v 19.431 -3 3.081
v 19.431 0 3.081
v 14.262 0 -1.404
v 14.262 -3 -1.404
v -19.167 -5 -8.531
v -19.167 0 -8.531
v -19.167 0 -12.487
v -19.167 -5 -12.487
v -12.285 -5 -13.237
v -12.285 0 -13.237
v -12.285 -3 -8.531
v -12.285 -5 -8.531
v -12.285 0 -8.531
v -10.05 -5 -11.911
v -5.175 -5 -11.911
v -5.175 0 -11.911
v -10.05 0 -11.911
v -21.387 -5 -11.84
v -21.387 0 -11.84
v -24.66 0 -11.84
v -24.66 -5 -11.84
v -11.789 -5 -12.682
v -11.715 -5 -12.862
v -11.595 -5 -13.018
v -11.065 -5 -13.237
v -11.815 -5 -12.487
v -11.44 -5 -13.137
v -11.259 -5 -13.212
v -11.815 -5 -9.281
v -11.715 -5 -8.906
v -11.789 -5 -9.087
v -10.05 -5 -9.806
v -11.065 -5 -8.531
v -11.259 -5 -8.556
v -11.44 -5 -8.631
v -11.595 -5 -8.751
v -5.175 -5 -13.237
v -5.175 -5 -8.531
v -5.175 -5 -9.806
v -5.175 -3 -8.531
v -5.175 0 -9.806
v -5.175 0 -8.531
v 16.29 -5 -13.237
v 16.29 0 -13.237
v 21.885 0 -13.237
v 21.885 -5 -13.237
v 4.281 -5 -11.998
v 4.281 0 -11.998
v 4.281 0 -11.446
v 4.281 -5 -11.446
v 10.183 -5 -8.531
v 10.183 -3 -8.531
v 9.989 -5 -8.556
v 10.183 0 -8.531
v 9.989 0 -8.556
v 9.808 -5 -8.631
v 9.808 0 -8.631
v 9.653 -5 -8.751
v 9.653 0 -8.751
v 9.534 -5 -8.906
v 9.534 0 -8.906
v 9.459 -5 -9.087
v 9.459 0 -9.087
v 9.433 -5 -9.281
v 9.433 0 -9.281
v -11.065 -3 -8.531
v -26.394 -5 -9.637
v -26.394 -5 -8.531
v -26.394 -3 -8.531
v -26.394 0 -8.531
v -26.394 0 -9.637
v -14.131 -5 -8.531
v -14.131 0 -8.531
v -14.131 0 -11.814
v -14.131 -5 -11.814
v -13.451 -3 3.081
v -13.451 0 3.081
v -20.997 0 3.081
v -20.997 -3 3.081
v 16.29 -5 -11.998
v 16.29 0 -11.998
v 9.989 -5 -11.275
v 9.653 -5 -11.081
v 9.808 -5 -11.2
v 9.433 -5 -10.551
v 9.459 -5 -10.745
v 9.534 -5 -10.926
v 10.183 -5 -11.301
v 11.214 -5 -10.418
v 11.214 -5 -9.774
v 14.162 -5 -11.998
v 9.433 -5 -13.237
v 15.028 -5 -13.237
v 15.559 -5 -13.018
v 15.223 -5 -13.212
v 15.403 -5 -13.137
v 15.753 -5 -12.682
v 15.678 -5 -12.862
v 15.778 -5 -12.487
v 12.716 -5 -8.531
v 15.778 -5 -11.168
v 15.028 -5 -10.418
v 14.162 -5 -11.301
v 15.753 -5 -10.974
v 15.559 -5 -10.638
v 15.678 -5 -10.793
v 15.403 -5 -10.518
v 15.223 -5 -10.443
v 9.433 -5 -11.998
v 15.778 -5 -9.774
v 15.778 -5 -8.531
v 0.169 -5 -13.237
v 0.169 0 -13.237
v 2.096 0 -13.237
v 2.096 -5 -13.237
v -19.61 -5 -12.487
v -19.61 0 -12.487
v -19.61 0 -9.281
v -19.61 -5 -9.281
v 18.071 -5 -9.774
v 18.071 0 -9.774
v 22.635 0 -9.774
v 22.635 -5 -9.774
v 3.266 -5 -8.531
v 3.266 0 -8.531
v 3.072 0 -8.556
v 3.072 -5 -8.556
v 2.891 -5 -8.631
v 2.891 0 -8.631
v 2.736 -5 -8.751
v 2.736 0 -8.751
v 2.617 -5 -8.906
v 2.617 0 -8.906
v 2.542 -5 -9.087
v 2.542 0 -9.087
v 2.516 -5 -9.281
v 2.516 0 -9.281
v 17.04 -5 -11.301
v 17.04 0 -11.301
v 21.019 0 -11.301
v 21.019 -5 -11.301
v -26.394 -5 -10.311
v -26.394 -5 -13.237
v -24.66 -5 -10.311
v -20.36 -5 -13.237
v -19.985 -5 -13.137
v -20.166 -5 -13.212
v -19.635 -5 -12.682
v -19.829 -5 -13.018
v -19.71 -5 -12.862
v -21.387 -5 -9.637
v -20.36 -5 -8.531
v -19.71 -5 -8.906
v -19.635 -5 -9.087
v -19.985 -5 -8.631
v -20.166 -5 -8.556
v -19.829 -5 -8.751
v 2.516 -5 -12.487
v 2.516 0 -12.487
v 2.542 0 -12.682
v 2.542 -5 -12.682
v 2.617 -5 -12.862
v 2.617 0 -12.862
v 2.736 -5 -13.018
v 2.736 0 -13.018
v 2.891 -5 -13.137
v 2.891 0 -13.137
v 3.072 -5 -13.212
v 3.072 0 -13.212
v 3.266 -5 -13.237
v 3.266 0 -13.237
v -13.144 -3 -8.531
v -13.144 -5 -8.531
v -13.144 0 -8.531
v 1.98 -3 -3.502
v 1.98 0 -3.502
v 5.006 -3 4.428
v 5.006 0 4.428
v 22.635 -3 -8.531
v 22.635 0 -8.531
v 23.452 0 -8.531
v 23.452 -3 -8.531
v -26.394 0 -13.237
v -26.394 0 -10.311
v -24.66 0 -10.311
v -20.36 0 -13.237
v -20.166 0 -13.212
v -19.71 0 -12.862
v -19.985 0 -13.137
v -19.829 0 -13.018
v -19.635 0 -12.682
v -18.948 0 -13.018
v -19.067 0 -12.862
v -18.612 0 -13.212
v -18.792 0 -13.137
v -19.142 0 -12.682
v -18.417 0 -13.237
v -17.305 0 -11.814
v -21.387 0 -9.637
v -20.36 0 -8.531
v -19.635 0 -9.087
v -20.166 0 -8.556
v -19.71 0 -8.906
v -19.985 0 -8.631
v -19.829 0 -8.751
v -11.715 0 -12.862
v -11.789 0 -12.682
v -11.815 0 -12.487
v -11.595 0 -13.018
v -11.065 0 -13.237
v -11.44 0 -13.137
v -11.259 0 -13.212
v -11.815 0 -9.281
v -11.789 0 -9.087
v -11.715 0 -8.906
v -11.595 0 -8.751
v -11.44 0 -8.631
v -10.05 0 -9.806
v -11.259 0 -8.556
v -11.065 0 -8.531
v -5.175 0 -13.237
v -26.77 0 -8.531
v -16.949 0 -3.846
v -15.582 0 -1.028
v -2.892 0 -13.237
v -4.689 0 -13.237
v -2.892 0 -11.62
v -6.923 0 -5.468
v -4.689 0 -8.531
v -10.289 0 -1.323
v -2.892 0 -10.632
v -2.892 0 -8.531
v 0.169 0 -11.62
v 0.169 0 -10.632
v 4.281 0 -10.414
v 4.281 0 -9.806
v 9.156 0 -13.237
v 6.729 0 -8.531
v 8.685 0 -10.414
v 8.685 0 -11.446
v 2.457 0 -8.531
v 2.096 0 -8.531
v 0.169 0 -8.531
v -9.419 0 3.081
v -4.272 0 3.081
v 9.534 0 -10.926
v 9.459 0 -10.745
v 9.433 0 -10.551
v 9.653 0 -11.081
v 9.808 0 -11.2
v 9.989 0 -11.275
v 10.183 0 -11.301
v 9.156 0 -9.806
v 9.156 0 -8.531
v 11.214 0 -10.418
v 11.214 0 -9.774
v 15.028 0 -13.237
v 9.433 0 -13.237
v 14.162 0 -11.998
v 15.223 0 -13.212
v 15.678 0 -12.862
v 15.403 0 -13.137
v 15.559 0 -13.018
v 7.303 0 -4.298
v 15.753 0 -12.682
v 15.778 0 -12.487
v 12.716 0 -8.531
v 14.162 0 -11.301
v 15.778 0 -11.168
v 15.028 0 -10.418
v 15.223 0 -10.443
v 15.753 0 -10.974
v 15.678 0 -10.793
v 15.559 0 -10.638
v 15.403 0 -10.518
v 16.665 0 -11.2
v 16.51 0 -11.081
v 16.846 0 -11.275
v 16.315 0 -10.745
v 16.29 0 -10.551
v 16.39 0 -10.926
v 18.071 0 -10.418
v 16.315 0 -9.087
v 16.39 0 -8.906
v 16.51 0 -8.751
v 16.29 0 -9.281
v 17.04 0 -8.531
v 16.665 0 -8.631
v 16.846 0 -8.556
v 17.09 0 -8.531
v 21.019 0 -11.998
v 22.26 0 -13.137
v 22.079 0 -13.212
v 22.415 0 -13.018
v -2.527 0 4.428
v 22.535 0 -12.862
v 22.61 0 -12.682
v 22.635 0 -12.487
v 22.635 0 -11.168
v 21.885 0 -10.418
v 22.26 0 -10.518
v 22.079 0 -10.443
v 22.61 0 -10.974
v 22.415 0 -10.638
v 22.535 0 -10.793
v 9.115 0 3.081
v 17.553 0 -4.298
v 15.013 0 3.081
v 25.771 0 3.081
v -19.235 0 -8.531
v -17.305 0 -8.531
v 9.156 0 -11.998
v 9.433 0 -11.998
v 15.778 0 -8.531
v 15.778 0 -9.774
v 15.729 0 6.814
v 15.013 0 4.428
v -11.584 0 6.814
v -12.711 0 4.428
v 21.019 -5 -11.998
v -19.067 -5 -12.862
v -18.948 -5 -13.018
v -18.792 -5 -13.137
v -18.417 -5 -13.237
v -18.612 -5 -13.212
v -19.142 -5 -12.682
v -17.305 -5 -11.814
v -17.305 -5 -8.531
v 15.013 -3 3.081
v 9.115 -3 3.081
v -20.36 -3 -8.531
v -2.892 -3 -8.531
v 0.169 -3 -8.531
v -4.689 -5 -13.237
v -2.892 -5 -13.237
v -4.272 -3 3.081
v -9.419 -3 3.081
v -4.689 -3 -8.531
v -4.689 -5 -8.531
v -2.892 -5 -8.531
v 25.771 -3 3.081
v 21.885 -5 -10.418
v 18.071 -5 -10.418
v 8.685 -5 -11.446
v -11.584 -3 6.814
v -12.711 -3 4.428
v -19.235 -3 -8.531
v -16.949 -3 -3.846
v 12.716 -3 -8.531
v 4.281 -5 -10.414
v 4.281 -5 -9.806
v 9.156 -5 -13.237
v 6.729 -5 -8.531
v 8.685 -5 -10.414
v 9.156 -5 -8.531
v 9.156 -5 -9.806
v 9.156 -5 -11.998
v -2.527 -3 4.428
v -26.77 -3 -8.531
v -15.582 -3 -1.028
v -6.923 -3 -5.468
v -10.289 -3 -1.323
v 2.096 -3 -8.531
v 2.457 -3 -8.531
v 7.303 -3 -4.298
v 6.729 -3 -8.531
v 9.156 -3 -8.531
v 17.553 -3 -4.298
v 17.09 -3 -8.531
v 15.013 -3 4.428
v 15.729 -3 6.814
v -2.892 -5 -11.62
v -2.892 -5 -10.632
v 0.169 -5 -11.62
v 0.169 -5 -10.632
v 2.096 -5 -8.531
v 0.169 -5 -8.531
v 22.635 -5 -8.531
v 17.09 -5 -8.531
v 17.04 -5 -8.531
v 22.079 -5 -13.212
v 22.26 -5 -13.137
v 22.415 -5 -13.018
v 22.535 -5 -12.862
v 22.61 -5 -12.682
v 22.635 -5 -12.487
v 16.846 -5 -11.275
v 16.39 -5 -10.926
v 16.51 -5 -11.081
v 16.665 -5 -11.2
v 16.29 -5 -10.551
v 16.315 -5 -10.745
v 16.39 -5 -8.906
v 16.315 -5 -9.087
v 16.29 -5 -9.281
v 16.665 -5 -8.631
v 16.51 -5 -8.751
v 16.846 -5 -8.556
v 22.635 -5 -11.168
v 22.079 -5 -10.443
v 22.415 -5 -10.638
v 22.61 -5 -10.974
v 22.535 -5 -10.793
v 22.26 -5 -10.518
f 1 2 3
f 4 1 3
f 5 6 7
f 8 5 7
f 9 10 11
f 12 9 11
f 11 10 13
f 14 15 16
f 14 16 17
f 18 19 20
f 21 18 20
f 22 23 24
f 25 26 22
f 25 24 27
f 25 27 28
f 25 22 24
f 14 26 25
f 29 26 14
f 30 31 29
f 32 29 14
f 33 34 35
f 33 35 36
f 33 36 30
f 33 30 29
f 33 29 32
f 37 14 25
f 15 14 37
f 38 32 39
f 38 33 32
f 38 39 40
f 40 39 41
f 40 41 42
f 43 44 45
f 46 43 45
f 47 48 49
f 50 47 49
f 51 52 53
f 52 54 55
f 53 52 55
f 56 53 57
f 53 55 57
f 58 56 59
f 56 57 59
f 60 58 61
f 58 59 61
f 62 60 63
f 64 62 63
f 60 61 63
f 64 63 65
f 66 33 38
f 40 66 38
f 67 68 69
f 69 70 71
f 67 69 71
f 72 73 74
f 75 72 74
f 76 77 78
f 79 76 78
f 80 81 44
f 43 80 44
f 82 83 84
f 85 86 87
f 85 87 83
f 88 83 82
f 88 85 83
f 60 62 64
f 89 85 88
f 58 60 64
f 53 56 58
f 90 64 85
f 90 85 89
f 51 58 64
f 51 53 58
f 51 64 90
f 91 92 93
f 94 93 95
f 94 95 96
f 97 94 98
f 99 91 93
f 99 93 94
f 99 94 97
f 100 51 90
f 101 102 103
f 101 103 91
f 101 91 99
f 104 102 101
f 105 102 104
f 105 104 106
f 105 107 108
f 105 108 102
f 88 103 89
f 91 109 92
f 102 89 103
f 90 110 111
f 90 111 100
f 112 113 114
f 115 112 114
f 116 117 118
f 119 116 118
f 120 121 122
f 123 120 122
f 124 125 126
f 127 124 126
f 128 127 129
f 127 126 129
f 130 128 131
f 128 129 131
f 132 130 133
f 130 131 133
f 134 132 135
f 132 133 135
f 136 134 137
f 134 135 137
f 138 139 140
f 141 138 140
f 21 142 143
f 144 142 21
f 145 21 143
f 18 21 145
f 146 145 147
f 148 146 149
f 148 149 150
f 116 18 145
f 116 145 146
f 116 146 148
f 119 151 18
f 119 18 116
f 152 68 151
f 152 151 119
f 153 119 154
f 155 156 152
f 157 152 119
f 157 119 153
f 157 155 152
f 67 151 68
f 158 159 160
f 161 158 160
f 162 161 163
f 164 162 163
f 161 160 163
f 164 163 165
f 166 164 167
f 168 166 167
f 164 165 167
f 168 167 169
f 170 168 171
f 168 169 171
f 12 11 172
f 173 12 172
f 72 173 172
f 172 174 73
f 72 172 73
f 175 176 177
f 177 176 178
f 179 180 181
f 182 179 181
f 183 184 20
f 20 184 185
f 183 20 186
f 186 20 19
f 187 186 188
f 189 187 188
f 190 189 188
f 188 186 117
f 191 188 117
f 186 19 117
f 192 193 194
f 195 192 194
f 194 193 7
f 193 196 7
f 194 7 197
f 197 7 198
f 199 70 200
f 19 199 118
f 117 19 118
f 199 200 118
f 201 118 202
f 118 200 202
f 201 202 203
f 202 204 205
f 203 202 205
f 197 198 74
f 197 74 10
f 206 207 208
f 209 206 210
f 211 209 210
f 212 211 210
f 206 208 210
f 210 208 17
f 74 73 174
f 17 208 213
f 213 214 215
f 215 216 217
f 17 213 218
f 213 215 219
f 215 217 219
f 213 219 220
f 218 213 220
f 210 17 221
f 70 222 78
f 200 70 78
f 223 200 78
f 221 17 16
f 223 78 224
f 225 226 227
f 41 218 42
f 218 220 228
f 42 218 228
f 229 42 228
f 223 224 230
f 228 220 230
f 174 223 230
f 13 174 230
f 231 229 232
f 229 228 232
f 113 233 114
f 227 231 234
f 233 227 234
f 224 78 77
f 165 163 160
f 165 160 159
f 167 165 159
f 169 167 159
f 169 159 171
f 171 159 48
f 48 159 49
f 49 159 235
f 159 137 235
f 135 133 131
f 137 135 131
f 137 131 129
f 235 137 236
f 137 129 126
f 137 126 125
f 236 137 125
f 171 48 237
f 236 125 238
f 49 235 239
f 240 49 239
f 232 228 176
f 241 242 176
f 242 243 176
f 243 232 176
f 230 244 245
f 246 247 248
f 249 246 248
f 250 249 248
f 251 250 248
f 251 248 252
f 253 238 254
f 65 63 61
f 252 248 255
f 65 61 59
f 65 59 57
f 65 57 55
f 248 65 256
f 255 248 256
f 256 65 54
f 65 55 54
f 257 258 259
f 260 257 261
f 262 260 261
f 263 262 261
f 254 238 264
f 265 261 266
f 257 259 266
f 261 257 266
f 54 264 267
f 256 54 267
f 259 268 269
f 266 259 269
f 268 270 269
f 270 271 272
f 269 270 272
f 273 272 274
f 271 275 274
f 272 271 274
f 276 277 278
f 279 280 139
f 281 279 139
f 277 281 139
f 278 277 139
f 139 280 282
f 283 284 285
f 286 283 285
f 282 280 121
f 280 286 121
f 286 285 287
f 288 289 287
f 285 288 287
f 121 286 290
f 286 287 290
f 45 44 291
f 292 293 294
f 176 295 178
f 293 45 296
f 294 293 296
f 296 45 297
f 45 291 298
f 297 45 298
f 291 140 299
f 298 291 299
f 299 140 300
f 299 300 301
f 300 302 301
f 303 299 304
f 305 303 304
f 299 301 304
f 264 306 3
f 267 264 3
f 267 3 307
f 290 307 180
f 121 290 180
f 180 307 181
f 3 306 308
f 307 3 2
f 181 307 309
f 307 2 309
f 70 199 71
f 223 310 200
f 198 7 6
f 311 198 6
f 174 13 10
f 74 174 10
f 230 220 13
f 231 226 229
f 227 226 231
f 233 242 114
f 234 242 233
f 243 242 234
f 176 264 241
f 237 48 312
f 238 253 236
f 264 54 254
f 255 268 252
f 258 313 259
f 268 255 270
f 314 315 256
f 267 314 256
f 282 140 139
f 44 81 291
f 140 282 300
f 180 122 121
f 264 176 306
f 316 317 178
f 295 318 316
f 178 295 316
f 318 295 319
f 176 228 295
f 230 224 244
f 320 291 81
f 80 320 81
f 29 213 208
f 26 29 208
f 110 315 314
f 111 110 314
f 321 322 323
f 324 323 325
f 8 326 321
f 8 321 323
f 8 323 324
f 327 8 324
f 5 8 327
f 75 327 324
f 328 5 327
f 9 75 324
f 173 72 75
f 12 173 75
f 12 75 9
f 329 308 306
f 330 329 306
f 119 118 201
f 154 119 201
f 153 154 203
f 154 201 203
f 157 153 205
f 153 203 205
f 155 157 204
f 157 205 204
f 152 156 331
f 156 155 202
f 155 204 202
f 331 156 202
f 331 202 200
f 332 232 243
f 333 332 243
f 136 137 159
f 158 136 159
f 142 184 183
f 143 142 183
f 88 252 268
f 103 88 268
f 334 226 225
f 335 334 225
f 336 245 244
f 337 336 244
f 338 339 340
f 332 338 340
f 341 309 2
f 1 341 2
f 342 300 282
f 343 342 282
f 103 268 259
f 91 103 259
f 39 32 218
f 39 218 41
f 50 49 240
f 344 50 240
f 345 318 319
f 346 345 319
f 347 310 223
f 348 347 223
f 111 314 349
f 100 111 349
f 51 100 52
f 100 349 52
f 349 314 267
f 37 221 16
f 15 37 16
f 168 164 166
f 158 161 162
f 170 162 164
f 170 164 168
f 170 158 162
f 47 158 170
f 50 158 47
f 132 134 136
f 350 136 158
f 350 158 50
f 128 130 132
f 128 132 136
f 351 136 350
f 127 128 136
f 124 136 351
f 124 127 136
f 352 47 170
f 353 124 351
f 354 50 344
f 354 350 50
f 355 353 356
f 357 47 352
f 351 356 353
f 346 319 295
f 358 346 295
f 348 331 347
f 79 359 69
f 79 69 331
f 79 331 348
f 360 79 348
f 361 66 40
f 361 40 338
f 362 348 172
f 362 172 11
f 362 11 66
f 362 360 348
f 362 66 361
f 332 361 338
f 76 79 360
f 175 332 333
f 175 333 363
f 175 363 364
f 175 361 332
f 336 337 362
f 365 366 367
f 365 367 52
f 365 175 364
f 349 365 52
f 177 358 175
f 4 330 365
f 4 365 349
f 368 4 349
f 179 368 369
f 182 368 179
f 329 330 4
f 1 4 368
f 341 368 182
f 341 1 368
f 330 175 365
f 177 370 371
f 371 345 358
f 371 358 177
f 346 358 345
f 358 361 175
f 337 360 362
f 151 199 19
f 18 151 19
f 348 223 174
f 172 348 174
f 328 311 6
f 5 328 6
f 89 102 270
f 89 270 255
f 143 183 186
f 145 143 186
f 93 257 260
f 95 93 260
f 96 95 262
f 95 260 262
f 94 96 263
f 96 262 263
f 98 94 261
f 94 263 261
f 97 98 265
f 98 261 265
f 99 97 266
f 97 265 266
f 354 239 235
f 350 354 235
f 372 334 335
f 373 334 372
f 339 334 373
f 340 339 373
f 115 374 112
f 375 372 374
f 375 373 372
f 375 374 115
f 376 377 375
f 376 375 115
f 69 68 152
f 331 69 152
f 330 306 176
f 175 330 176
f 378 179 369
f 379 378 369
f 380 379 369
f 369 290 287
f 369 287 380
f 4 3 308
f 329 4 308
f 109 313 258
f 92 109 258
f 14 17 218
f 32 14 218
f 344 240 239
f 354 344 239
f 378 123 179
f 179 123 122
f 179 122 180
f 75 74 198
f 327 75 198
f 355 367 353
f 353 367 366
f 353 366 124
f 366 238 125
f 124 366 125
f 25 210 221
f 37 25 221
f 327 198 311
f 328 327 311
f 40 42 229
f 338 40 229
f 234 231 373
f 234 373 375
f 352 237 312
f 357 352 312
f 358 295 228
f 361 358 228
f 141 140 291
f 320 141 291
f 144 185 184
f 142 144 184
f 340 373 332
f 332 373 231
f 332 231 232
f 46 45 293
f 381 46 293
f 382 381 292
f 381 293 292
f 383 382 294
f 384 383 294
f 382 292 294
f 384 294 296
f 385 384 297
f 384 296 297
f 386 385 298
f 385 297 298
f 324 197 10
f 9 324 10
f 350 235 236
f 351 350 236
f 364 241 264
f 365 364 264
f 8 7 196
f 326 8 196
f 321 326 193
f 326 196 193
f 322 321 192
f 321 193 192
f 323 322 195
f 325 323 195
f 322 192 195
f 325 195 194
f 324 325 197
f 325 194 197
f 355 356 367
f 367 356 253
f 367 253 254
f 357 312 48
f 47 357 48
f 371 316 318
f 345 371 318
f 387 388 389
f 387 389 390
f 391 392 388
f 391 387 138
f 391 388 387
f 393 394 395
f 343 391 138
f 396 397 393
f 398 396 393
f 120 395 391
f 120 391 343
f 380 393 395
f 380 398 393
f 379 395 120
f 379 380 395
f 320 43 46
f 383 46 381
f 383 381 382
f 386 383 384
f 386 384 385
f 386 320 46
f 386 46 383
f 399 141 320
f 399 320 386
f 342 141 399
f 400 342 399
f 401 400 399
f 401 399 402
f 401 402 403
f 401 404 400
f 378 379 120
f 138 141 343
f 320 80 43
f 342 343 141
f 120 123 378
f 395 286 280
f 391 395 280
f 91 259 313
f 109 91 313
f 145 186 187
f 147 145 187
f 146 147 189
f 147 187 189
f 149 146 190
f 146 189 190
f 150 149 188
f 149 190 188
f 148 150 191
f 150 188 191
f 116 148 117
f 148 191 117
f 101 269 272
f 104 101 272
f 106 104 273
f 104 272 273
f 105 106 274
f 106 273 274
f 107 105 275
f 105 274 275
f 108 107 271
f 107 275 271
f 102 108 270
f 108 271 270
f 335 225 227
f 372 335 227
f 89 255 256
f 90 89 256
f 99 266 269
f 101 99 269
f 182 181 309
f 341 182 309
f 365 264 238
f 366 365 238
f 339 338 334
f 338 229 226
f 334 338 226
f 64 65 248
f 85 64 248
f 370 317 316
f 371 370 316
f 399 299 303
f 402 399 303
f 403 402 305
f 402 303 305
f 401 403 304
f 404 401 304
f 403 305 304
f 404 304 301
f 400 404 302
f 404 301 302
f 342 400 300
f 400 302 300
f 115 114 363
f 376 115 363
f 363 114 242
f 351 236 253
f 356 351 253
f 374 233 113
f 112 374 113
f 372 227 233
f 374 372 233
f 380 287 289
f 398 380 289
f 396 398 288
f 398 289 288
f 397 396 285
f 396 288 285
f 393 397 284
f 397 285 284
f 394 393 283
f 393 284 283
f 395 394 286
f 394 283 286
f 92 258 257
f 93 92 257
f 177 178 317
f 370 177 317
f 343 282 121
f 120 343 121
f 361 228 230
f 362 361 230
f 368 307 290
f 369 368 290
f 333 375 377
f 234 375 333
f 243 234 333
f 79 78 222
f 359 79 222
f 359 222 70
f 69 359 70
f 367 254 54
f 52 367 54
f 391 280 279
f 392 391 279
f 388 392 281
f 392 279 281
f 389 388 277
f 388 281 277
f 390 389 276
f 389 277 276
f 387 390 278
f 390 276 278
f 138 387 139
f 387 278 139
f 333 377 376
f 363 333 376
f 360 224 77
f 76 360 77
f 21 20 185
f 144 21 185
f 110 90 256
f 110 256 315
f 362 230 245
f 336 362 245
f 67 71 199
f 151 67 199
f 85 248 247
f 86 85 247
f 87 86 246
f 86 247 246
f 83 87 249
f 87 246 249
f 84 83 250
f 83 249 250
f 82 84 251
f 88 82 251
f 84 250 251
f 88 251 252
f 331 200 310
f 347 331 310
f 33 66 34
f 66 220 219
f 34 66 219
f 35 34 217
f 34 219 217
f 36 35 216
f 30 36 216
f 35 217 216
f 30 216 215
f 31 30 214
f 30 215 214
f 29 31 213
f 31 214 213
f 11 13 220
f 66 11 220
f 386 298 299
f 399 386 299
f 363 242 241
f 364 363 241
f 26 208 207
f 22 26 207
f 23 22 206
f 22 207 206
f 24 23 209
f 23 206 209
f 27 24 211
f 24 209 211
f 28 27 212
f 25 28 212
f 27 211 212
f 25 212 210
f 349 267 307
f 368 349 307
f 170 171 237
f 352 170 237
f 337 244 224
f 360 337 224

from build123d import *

# Parameters (mm, degrees)
F0_W     = 3.0607780209
F0_H     = 2.1009956449
F1_DEPTH = 5
F2_W     = 53.2925797864
F2_H     = 15.6581131741
F3_DEPTH = 2


with BuildPart() as f1:
    # F0 (on Front) → F1 (new body)
    with BuildSketch(Plane.XZ):
        with BuildLine():
            Line((-13.4510826319, 3.0807058793), (-20.9973859143, 3.0807058793))
            Line((-20.9973859143, 3.0807058793), (-26.770388545, -8.5309240967))
            Line((-26.770388545, -8.5309240967), (-26.3940021396, -8.5309240967))
            Line((-26.3940021396, -8.5309240967), (-26.3940021396, -9.6365026161))
            Line((-26.3940021396, -9.6365026161), (-21.3870331645, -9.6365026161))
            Line((-21.3870331645, -9.6365026161), (-21.3870331645, -11.8402632847))
            Line((-21.3870331645, -11.8402632847), (-24.6597826481, -11.8402632847))
            Line((-24.6597826481, -11.8402632847), (-24.6597826481, -10.3107876107))
            Line((-24.6597826481, -10.3107876107), (-26.3940021396, -10.3107876107))
            Line((-26.3940021396, -10.3107876107), (-26.3940021396, -13.2374753207))
            Line((-26.3940021396, -13.2374753207), (-20.359800871, -13.2374753207))
            ThreePointArc((-20.359800871, -13.2374753207), (-19.8294707851, -13.0178054066), (-19.609800871, -12.4874753207))
            Line((-19.609800871, -12.4874753207), (-19.609800871, -9.2809240967))
            ThreePointArc((-19.609800871, -9.2809240967), (-19.8294707851, -8.7505940108), (-20.359800871, -8.5309240967))
            Line((-20.359800871, -8.5309240967), (-19.2351932671, -8.5309240967))
            Line((-19.2351932671, -8.5309240967), (-16.9493351132, -3.8456239272))
            Line((-16.9493351132, -3.8456239272), (-13.144302211, -8.5309240967))
            Line((-13.144302211, -8.5309240967), (-14.130868949, -8.5309240967))
            Line((-14.130868949, -8.5309240967), (-14.130868949, -11.8141257167))
            Line((-14.130868949, -11.8141257167), (-17.3050090671, -11.8141257167))
            Line((-17.3050090671, -11.8141257167), (-17.3050090671, -8.5309240967))
            Line((-17.3050090671, -8.5309240967), (-19.167387858, -8.5309240967))
            Line((-19.167387858, -8.5309240967), (-19.167387858, -12.4874120876))
            ThreePointArc((-19.167387858, -12.4874120876), (-18.9477179439, -13.0177421735), (-18.417387858, -13.2374120876))
            Line((-18.417387858, -13.2374120876), (-12.2846849263, -13.2374120876))
            Line((-12.2846849263, -13.2374120876), (-12.2846849263, -8.5309240967))
            Line((-12.2846849263, -8.5309240967), (-11.065042235, -8.5309240967))
            ThreePointArc((-11.065042235, -8.5309240967), (-11.5953723208, -8.7505940108), (-11.815042235, -9.2809240967))
            Line((-11.815042235, -9.2809240967), (-11.815042235, -12.4874753207))
            ThreePointArc((-11.815042235, -12.4874753207), (-11.5953723208, -13.0178054066), (-11.065042235, -13.2374753207))
            Line((-11.065042235, -13.2374753207), (-5.1752589643, -13.2374753207))
            Line((-5.1752589643, -13.2374753207), (-5.1752589643, -11.9112924635))
            Line((-5.1752589643, -11.9112924635), (-10.0498311222, -11.9112924635))
            Line((-10.0498311222, -11.9112924635), (-10.0498311222, -9.8059958741))
            Line((-10.0498311222, -9.8059958741), (-5.1752589643, -9.8059958741))
            Line((-5.1752589643, -9.8059958741), (-5.1752589643, -8.5309240967))
            Line((-5.1752589643, -8.5309240967), (-4.6894219704, -8.5309240967))
            Line((-4.6894219704, -8.5309240967), (-4.6894219704, -13.2374753207))
            Line((-4.6894219704, -13.2374753207), (-2.891822136, -13.2374753207))
            Line((-2.891822136, -13.2374753207), (-2.891822136, -11.6197903603))
            Line((-2.891822136, -11.6197903603), (0.1689558849, -11.6197903603))
            Line((0.1689558849, -11.6197903603), (0.1689558849, -13.2374753207))
            Line((0.1689558849, -13.2374753207), (2.096112119, -13.2374753207))
            Line((2.096112119, -13.2374753207), (2.096112119, -8.5309240967))
            Line((2.096112119, -8.5309240967), (2.4571896065, -8.5309240967))
            Line((2.4571896065, -8.5309240967), (7.3034735397, -4.2975358665))
            Line((7.3034735397, -4.2975358665), (6.7291194573, -8.5309240967))
            Line((6.7291194573, -8.5309240967), (3.2661118247, -8.5309240967))
            ThreePointArc((3.2661118247, -8.5309240967), (2.7357817388, -8.7505940108), (2.5161118247, -9.2809240967))
            Line((2.5161118247, -9.2809240967), (2.5161118247, -12.4874753207))
            ThreePointArc((2.5161118247, -12.4874753207), (2.7357817388, -13.0178054066), (3.2661118247, -13.2374753207))
            Line((3.2661118247, -13.2374753207), (9.1558950953, -13.2374753207))
            Line((9.1558950953, -13.2374753207), (9.1558950953, -11.9984643534))
            Line((9.1558950953, -11.9984643534), (4.2813229375, -11.9984643534))
            Line((4.2813229375, -11.9984643534), (4.2813229375, -11.445844546))
            Line((4.2813229375, -11.445844546), (8.6850486696, -11.445844546))
            Line((8.6850486696, -11.445844546), (8.6850486696, -10.4135535657))
            Line((8.6850486696, -10.4135535657), (4.2813229375, -10.4135535657))
            Line((4.2813229375, -10.4135535657), (4.2813229375, -9.805932641))
            Line((4.2813229375, -9.805932641), (9.1558950953, -9.805932641))
            Line((9.1558950953, -9.805932641), (9.1558950953, -8.5309240967))
            Line((9.1558950953, -8.5309240967), (10.1831596047, -8.5309240967))
            ThreePointArc((10.1831596047, -8.5309240967), (9.6528295188, -8.7505940108), (9.4331596047, -9.2809240967))
            Line((9.4331596047, -9.2809240967), (9.4331596047, -10.550885953))
            ThreePointArc((9.4331596047, -10.550885953), (9.6528295188, -11.0812160389), (10.1831596047, -11.300885953))
            Line((10.1831596047, -11.300885953), (14.1622014344, -11.300885953))
            Line((14.1622014344, -11.300885953), (14.1622014344, -11.9984643534))
            Line((14.1622014344, -11.9984643534), (9.4331596047, -11.9984643534))
            Line((9.4331596047, -11.9984643534), (9.4331596047, -13.2374120876))
            Line((9.4331596047, -13.2374120876), (15.0284558833, -13.2374120876))
            ThreePointArc((15.0284558833, -13.2374120876), (15.5587859692, -13.0177421735), (15.7784558833, -12.4874120876))
            Line((15.7784558833, -12.4874120876), (15.7784558833, -11.1678693146))
            ThreePointArc((15.7784558833, -11.1678693146), (15.5587859692, -10.6375392287), (15.0284558833, -10.4178693146))
            Line((15.0284558833, -10.4178693146), (11.2140327692, -10.4178693146))
            Line((11.2140327692, -10.4178693146), (11.2140327692, -9.7743598744))
            Line((11.2140327692, -9.7743598744), (15.7784558833, -9.7743598744))
            Line((15.7784558833, -9.7743598744), (15.7784558833, -8.5309240967))
            Line((15.7784558833, -8.5309240967), (12.7156563103, -8.5309240967))
            Line((12.7156563103, -8.5309240967), (17.5534840673, -4.2975358665))
            Line((17.5534840673, -4.2975358665), (17.0895829797, -8.5309240967))
            Line((17.0895829797, -8.5309240967), (17.0398395211, -8.5309240967))
            ThreePointArc((17.0398395211, -8.5309240967), (16.5095094352, -8.7505940108), (16.2898395211, -9.2809240967))
            Line((16.2898395211, -9.2809240967), (16.2898395211, -10.550885953))
            ThreePointArc((16.2898395211, -10.550885953), (16.5095094352, -11.0812160389), (17.0398395211, -11.300885953))
            Line((17.0398395211, -11.300885953), (21.0188813508, -11.300885953))
            Line((21.0188813508, -11.300885953), (21.0188813508, -11.9984643534))
            Line((21.0188813508, -11.9984643534), (16.2898395211, -11.9984643534))
            Line((16.2898395211, -11.9984643534), (16.2898395211, -13.2374120876))
            Line((16.2898395211, -13.2374120876), (21.8851357996, -13.2374120876))
            ThreePointArc((21.8851357996, -13.2374120876), (22.4154658855, -13.0177421735), (22.6351357996, -12.4874120876))
            Line((22.6351357996, -12.4874120876), (22.6351357996, -11.1678693146))
            ThreePointArc((22.6351357996, -11.1678693146), (22.4154658855, -10.6375392287), (21.8851357996, -10.4178693146))
            Line((21.8851357996, -10.4178693146), (18.0707126856, -10.4178693146))
            Line((18.0707126856, -10.4178693146), (18.0707126856, -9.7743598744))
            Line((18.0707126856, -9.7743598744), (22.6351357996, -9.7743598744))
            Line((22.6351357996, -9.7743598744), (22.6351357996, -8.5309240967))
            Line((22.6351357996, -8.5309240967), (23.4516598284, -8.5309240967))
            Line((23.4516598284, -8.5309240967), (25.7711652666, 3.0807058793))
            Line((25.7711652666, 3.0807058793), (19.431181252, 3.0807058793))
            Line((19.431181252, 3.0807058793), (14.2619935796, -1.4036741341))
            Line((14.2619935796, -1.4036741341), (15.0130717084, 3.0807058793))
            Line((15.0130717084, 3.0807058793), (9.1148968786, 3.0807058793))
            Line((9.1148968786, 3.0807058793), (1.9796516281, -3.5022755619))
            Line((1.9796516281, -3.5022755619), (5.0060558133, 4.4282288291))
            Line((5.0060558133, 4.4282288291), (15.0130717084, 4.4282288291))
            Line((15.0130717084, 4.4282288291), (15.7288057171, 6.8140071817))
            Line((15.7288057171, 6.8140071817), (-11.583940126, 6.8140071817))
            Line((-11.583940126, 6.8140071817), (-12.7105582505, 4.4282288291))
            Line((-12.7105582505, 4.4282288291), (-2.5268180761, 4.4282288291))
            Line((-2.5268180761, 4.4282288291), (-6.9228359498, -5.4683336057))
            Line((-6.9228359498, -5.4683336057), (-10.288979272, -1.3234569953))
            Line((-10.288979272, -1.3234569953), (-4.2719710618, 3.0807058793))
            Line((-4.2719710618, 3.0807058793), (-9.4190677628, 3.0807058793))
            Line((-9.4190677628, 3.0807058793), (-15.5823286623, -1.0281349532))
            Line((-15.5823286623, -1.0281349532), (-13.4510826319, 3.0807058793))
        make_face()
        with Locations((-1.3614331256, -9.5814219192)):
            Rectangle(F0_W, F0_H, mode=Mode.SUBTRACT)
    extrude(amount=F1_DEPTH)

    # F2 (on face) → F3 (cut)
    with BuildSketch(Plane.XZ.offset(5)):
        with Locations((-0.1240986518, -0.7018675096)):
            Rectangle(F2_W, F2_H)
    extrude(amount=-F3_DEPTH, mode=Mode.SUBTRACT)


solid = f1.part
